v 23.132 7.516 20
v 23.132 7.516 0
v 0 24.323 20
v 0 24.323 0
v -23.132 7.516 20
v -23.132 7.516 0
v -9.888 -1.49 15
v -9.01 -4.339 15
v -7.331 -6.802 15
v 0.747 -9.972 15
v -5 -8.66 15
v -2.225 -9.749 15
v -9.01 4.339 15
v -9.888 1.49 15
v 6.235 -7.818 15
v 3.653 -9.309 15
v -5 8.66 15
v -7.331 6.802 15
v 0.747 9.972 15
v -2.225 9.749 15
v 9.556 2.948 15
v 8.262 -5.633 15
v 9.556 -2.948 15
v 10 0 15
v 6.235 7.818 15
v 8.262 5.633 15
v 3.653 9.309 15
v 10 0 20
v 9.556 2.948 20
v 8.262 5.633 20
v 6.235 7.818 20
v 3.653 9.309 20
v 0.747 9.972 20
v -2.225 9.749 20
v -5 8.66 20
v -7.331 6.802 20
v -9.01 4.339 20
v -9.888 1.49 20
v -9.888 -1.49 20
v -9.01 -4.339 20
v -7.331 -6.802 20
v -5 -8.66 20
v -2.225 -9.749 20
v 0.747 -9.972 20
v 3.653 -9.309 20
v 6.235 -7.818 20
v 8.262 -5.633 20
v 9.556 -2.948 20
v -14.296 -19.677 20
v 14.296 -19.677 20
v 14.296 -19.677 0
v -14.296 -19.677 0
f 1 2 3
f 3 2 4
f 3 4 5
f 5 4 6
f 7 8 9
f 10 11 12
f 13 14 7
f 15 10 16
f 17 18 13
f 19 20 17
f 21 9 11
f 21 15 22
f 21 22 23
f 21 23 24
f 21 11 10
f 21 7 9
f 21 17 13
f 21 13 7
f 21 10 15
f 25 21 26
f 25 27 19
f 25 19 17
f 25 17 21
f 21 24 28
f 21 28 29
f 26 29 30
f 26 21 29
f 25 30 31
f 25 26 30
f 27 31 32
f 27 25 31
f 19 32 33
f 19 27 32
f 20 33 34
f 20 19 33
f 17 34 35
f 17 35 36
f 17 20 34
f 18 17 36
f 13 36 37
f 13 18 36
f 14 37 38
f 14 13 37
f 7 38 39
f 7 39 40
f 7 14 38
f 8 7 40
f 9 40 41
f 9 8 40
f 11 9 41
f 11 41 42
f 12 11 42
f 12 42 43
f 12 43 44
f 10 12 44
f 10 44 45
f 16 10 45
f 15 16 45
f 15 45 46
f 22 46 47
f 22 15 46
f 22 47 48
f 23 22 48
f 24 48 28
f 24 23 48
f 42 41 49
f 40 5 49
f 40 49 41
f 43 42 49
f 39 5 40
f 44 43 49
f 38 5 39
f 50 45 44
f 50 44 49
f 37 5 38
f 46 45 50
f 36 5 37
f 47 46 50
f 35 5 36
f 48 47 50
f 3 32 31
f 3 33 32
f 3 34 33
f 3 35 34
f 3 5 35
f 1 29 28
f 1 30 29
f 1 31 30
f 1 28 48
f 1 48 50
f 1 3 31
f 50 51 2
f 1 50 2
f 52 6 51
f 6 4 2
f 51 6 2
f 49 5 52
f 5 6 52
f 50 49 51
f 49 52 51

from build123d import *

# Parameters (mm, degrees)
F1_DEPTH = 15
F2_R     = 10
F3_DEPTH = 5


with BuildPart() as f1:
    # F0 (on Top) → F1 (new body)
    with BuildSketch(Plane.XY):
        Polygon((0, -19.677398), (0, 24.322602), (-23.132169, 7.516097), (-14.296467, -19.677398), align=None)
        Polygon((23.132169, 7.516097), (0, 24.322602), (0, -19.677398), (14.296467, -19.677398), align=None)
    extrude(amount=F1_DEPTH)

    # F2 (on face) → F3 (join)
    with BuildSketch(Plane.XY.offset(15)):
        Polygon((0, 24.322602), (-23.132169, 7.516097), (-14.296467, -19.677398), (14.296467, -19.677398), (23.132169, 7.516097), align=None)
        Circle(F2_R, mode=Mode.SUBTRACT)
    extrude(amount=F3_DEPTH)


solid = f1.part
